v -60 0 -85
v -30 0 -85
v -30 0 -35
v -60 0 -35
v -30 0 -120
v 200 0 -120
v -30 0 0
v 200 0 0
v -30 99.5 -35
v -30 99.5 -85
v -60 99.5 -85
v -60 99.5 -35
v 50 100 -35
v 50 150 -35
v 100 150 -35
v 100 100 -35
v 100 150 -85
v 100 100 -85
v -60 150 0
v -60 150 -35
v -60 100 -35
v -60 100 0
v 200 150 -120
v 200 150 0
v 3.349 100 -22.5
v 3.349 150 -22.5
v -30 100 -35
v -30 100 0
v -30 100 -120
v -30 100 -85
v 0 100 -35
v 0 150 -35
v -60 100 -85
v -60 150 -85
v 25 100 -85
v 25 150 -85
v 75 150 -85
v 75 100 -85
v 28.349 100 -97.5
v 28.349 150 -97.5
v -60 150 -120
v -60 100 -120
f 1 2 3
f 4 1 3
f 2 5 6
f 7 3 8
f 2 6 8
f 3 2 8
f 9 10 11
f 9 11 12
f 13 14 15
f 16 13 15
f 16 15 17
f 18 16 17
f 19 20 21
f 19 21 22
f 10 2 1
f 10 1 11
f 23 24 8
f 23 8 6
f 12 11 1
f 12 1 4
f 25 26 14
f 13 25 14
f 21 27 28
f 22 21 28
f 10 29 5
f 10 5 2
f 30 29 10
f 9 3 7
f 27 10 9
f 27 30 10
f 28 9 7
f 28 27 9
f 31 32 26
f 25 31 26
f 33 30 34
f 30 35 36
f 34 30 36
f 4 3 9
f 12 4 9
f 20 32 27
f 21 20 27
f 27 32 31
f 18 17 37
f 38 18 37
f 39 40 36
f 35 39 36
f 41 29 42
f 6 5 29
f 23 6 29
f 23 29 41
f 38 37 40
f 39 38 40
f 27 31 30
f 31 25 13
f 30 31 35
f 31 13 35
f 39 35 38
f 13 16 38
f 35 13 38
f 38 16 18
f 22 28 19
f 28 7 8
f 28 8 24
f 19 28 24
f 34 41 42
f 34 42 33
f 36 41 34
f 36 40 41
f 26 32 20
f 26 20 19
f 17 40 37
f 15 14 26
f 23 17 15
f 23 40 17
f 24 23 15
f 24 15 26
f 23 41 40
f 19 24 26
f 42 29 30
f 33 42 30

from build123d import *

# Parameters (mm, degrees)
SKETCH_1_W          = 120
SKETCH_1_H          = 150
EXTRUDE_1_DEPTH     = 200
CUT_EXTRUDE_1_DEPTH = 50
EXTRUDE_3_DEPTH     = 30
SKETCH_4_W          = 35
SKETCH_4_H          = 50
EXTRUDE_4_DEPTH     = 30
SKETCH_5_W          = 50
SKETCH_5_H          = 99.5
EXTRUDE_7_DEPTH     = 30


with BuildPart() as part:
    # 草图1 → 凸台-拉伸1 (new body)
    with BuildSketch(Plane(origin=(0, 0, 0), x_dir=(0, 0, -1), z_dir=(1, 0, 0))):
        with Locations((60, 75)):
            Rectangle(SKETCH_1_W, SKETCH_1_H)
    extrude(amount=EXTRUDE_1_DEPTH)

    # 草图2 → 切除-拉伸1 (cut)
    with BuildSketch(Plane(origin=(0, 150, 0), x_dir=(1, 0, 0), z_dir=(0, 1, 0))):
        Polygon((75, 85), (25, 85), (71.650635095, 72.5), align=None)
        Polygon((28.349364905, 97.5), (25, 85), (75, 85), align=None)
        Polygon((25, 85), (0, 85), (0, 35), (46.650635095, 47.5), (50, 35), (100, 35), (100, 85), (75, 85), (71.650635095, 72.5), align=None)
        Polygon((46.650635095, 47.5), (0, 35), (50, 35), align=None)
        Polygon((50, 35), (0, 35), (3.349364905, 22.5), align=None)
    extrude(amount=-CUT_EXTRUDE_1_DEPTH, mode=Mode.SUBTRACT)

    # 草图3 → 凸台-拉伸3 (add)
    with BuildSketch(Plane.ZY):
        Polygon((-35, 100), (-85, 100), (-85, 150), (-120, 150), (-120, 0), (0, 0), (0, 150), (-35, 150), align=None)
    extrude(amount=EXTRUDE_3_DEPTH)

    # 草图4 → 凸台-拉伸4 (add)
    with BuildSketch(Plane.ZY.offset(30)):
        with Locations((-102.5, 125)):
            Rectangle(SKETCH_4_W, SKETCH_4_H)
        with Locations((-17.5, 125)):
            Rectangle(SKETCH_4_W, SKETCH_4_H)
    extrude(amount=EXTRUDE_4_DEPTH)

    # 草图5 → 凸台-拉伸7 (add)
    with BuildSketch(Plane.ZY.offset(30)):
        with Locations((-60, 49.75)):
            Rectangle(SKETCH_5_W, SKETCH_5_H)
    extrude(amount=EXTRUDE_7_DEPTH)


solid = part.part
